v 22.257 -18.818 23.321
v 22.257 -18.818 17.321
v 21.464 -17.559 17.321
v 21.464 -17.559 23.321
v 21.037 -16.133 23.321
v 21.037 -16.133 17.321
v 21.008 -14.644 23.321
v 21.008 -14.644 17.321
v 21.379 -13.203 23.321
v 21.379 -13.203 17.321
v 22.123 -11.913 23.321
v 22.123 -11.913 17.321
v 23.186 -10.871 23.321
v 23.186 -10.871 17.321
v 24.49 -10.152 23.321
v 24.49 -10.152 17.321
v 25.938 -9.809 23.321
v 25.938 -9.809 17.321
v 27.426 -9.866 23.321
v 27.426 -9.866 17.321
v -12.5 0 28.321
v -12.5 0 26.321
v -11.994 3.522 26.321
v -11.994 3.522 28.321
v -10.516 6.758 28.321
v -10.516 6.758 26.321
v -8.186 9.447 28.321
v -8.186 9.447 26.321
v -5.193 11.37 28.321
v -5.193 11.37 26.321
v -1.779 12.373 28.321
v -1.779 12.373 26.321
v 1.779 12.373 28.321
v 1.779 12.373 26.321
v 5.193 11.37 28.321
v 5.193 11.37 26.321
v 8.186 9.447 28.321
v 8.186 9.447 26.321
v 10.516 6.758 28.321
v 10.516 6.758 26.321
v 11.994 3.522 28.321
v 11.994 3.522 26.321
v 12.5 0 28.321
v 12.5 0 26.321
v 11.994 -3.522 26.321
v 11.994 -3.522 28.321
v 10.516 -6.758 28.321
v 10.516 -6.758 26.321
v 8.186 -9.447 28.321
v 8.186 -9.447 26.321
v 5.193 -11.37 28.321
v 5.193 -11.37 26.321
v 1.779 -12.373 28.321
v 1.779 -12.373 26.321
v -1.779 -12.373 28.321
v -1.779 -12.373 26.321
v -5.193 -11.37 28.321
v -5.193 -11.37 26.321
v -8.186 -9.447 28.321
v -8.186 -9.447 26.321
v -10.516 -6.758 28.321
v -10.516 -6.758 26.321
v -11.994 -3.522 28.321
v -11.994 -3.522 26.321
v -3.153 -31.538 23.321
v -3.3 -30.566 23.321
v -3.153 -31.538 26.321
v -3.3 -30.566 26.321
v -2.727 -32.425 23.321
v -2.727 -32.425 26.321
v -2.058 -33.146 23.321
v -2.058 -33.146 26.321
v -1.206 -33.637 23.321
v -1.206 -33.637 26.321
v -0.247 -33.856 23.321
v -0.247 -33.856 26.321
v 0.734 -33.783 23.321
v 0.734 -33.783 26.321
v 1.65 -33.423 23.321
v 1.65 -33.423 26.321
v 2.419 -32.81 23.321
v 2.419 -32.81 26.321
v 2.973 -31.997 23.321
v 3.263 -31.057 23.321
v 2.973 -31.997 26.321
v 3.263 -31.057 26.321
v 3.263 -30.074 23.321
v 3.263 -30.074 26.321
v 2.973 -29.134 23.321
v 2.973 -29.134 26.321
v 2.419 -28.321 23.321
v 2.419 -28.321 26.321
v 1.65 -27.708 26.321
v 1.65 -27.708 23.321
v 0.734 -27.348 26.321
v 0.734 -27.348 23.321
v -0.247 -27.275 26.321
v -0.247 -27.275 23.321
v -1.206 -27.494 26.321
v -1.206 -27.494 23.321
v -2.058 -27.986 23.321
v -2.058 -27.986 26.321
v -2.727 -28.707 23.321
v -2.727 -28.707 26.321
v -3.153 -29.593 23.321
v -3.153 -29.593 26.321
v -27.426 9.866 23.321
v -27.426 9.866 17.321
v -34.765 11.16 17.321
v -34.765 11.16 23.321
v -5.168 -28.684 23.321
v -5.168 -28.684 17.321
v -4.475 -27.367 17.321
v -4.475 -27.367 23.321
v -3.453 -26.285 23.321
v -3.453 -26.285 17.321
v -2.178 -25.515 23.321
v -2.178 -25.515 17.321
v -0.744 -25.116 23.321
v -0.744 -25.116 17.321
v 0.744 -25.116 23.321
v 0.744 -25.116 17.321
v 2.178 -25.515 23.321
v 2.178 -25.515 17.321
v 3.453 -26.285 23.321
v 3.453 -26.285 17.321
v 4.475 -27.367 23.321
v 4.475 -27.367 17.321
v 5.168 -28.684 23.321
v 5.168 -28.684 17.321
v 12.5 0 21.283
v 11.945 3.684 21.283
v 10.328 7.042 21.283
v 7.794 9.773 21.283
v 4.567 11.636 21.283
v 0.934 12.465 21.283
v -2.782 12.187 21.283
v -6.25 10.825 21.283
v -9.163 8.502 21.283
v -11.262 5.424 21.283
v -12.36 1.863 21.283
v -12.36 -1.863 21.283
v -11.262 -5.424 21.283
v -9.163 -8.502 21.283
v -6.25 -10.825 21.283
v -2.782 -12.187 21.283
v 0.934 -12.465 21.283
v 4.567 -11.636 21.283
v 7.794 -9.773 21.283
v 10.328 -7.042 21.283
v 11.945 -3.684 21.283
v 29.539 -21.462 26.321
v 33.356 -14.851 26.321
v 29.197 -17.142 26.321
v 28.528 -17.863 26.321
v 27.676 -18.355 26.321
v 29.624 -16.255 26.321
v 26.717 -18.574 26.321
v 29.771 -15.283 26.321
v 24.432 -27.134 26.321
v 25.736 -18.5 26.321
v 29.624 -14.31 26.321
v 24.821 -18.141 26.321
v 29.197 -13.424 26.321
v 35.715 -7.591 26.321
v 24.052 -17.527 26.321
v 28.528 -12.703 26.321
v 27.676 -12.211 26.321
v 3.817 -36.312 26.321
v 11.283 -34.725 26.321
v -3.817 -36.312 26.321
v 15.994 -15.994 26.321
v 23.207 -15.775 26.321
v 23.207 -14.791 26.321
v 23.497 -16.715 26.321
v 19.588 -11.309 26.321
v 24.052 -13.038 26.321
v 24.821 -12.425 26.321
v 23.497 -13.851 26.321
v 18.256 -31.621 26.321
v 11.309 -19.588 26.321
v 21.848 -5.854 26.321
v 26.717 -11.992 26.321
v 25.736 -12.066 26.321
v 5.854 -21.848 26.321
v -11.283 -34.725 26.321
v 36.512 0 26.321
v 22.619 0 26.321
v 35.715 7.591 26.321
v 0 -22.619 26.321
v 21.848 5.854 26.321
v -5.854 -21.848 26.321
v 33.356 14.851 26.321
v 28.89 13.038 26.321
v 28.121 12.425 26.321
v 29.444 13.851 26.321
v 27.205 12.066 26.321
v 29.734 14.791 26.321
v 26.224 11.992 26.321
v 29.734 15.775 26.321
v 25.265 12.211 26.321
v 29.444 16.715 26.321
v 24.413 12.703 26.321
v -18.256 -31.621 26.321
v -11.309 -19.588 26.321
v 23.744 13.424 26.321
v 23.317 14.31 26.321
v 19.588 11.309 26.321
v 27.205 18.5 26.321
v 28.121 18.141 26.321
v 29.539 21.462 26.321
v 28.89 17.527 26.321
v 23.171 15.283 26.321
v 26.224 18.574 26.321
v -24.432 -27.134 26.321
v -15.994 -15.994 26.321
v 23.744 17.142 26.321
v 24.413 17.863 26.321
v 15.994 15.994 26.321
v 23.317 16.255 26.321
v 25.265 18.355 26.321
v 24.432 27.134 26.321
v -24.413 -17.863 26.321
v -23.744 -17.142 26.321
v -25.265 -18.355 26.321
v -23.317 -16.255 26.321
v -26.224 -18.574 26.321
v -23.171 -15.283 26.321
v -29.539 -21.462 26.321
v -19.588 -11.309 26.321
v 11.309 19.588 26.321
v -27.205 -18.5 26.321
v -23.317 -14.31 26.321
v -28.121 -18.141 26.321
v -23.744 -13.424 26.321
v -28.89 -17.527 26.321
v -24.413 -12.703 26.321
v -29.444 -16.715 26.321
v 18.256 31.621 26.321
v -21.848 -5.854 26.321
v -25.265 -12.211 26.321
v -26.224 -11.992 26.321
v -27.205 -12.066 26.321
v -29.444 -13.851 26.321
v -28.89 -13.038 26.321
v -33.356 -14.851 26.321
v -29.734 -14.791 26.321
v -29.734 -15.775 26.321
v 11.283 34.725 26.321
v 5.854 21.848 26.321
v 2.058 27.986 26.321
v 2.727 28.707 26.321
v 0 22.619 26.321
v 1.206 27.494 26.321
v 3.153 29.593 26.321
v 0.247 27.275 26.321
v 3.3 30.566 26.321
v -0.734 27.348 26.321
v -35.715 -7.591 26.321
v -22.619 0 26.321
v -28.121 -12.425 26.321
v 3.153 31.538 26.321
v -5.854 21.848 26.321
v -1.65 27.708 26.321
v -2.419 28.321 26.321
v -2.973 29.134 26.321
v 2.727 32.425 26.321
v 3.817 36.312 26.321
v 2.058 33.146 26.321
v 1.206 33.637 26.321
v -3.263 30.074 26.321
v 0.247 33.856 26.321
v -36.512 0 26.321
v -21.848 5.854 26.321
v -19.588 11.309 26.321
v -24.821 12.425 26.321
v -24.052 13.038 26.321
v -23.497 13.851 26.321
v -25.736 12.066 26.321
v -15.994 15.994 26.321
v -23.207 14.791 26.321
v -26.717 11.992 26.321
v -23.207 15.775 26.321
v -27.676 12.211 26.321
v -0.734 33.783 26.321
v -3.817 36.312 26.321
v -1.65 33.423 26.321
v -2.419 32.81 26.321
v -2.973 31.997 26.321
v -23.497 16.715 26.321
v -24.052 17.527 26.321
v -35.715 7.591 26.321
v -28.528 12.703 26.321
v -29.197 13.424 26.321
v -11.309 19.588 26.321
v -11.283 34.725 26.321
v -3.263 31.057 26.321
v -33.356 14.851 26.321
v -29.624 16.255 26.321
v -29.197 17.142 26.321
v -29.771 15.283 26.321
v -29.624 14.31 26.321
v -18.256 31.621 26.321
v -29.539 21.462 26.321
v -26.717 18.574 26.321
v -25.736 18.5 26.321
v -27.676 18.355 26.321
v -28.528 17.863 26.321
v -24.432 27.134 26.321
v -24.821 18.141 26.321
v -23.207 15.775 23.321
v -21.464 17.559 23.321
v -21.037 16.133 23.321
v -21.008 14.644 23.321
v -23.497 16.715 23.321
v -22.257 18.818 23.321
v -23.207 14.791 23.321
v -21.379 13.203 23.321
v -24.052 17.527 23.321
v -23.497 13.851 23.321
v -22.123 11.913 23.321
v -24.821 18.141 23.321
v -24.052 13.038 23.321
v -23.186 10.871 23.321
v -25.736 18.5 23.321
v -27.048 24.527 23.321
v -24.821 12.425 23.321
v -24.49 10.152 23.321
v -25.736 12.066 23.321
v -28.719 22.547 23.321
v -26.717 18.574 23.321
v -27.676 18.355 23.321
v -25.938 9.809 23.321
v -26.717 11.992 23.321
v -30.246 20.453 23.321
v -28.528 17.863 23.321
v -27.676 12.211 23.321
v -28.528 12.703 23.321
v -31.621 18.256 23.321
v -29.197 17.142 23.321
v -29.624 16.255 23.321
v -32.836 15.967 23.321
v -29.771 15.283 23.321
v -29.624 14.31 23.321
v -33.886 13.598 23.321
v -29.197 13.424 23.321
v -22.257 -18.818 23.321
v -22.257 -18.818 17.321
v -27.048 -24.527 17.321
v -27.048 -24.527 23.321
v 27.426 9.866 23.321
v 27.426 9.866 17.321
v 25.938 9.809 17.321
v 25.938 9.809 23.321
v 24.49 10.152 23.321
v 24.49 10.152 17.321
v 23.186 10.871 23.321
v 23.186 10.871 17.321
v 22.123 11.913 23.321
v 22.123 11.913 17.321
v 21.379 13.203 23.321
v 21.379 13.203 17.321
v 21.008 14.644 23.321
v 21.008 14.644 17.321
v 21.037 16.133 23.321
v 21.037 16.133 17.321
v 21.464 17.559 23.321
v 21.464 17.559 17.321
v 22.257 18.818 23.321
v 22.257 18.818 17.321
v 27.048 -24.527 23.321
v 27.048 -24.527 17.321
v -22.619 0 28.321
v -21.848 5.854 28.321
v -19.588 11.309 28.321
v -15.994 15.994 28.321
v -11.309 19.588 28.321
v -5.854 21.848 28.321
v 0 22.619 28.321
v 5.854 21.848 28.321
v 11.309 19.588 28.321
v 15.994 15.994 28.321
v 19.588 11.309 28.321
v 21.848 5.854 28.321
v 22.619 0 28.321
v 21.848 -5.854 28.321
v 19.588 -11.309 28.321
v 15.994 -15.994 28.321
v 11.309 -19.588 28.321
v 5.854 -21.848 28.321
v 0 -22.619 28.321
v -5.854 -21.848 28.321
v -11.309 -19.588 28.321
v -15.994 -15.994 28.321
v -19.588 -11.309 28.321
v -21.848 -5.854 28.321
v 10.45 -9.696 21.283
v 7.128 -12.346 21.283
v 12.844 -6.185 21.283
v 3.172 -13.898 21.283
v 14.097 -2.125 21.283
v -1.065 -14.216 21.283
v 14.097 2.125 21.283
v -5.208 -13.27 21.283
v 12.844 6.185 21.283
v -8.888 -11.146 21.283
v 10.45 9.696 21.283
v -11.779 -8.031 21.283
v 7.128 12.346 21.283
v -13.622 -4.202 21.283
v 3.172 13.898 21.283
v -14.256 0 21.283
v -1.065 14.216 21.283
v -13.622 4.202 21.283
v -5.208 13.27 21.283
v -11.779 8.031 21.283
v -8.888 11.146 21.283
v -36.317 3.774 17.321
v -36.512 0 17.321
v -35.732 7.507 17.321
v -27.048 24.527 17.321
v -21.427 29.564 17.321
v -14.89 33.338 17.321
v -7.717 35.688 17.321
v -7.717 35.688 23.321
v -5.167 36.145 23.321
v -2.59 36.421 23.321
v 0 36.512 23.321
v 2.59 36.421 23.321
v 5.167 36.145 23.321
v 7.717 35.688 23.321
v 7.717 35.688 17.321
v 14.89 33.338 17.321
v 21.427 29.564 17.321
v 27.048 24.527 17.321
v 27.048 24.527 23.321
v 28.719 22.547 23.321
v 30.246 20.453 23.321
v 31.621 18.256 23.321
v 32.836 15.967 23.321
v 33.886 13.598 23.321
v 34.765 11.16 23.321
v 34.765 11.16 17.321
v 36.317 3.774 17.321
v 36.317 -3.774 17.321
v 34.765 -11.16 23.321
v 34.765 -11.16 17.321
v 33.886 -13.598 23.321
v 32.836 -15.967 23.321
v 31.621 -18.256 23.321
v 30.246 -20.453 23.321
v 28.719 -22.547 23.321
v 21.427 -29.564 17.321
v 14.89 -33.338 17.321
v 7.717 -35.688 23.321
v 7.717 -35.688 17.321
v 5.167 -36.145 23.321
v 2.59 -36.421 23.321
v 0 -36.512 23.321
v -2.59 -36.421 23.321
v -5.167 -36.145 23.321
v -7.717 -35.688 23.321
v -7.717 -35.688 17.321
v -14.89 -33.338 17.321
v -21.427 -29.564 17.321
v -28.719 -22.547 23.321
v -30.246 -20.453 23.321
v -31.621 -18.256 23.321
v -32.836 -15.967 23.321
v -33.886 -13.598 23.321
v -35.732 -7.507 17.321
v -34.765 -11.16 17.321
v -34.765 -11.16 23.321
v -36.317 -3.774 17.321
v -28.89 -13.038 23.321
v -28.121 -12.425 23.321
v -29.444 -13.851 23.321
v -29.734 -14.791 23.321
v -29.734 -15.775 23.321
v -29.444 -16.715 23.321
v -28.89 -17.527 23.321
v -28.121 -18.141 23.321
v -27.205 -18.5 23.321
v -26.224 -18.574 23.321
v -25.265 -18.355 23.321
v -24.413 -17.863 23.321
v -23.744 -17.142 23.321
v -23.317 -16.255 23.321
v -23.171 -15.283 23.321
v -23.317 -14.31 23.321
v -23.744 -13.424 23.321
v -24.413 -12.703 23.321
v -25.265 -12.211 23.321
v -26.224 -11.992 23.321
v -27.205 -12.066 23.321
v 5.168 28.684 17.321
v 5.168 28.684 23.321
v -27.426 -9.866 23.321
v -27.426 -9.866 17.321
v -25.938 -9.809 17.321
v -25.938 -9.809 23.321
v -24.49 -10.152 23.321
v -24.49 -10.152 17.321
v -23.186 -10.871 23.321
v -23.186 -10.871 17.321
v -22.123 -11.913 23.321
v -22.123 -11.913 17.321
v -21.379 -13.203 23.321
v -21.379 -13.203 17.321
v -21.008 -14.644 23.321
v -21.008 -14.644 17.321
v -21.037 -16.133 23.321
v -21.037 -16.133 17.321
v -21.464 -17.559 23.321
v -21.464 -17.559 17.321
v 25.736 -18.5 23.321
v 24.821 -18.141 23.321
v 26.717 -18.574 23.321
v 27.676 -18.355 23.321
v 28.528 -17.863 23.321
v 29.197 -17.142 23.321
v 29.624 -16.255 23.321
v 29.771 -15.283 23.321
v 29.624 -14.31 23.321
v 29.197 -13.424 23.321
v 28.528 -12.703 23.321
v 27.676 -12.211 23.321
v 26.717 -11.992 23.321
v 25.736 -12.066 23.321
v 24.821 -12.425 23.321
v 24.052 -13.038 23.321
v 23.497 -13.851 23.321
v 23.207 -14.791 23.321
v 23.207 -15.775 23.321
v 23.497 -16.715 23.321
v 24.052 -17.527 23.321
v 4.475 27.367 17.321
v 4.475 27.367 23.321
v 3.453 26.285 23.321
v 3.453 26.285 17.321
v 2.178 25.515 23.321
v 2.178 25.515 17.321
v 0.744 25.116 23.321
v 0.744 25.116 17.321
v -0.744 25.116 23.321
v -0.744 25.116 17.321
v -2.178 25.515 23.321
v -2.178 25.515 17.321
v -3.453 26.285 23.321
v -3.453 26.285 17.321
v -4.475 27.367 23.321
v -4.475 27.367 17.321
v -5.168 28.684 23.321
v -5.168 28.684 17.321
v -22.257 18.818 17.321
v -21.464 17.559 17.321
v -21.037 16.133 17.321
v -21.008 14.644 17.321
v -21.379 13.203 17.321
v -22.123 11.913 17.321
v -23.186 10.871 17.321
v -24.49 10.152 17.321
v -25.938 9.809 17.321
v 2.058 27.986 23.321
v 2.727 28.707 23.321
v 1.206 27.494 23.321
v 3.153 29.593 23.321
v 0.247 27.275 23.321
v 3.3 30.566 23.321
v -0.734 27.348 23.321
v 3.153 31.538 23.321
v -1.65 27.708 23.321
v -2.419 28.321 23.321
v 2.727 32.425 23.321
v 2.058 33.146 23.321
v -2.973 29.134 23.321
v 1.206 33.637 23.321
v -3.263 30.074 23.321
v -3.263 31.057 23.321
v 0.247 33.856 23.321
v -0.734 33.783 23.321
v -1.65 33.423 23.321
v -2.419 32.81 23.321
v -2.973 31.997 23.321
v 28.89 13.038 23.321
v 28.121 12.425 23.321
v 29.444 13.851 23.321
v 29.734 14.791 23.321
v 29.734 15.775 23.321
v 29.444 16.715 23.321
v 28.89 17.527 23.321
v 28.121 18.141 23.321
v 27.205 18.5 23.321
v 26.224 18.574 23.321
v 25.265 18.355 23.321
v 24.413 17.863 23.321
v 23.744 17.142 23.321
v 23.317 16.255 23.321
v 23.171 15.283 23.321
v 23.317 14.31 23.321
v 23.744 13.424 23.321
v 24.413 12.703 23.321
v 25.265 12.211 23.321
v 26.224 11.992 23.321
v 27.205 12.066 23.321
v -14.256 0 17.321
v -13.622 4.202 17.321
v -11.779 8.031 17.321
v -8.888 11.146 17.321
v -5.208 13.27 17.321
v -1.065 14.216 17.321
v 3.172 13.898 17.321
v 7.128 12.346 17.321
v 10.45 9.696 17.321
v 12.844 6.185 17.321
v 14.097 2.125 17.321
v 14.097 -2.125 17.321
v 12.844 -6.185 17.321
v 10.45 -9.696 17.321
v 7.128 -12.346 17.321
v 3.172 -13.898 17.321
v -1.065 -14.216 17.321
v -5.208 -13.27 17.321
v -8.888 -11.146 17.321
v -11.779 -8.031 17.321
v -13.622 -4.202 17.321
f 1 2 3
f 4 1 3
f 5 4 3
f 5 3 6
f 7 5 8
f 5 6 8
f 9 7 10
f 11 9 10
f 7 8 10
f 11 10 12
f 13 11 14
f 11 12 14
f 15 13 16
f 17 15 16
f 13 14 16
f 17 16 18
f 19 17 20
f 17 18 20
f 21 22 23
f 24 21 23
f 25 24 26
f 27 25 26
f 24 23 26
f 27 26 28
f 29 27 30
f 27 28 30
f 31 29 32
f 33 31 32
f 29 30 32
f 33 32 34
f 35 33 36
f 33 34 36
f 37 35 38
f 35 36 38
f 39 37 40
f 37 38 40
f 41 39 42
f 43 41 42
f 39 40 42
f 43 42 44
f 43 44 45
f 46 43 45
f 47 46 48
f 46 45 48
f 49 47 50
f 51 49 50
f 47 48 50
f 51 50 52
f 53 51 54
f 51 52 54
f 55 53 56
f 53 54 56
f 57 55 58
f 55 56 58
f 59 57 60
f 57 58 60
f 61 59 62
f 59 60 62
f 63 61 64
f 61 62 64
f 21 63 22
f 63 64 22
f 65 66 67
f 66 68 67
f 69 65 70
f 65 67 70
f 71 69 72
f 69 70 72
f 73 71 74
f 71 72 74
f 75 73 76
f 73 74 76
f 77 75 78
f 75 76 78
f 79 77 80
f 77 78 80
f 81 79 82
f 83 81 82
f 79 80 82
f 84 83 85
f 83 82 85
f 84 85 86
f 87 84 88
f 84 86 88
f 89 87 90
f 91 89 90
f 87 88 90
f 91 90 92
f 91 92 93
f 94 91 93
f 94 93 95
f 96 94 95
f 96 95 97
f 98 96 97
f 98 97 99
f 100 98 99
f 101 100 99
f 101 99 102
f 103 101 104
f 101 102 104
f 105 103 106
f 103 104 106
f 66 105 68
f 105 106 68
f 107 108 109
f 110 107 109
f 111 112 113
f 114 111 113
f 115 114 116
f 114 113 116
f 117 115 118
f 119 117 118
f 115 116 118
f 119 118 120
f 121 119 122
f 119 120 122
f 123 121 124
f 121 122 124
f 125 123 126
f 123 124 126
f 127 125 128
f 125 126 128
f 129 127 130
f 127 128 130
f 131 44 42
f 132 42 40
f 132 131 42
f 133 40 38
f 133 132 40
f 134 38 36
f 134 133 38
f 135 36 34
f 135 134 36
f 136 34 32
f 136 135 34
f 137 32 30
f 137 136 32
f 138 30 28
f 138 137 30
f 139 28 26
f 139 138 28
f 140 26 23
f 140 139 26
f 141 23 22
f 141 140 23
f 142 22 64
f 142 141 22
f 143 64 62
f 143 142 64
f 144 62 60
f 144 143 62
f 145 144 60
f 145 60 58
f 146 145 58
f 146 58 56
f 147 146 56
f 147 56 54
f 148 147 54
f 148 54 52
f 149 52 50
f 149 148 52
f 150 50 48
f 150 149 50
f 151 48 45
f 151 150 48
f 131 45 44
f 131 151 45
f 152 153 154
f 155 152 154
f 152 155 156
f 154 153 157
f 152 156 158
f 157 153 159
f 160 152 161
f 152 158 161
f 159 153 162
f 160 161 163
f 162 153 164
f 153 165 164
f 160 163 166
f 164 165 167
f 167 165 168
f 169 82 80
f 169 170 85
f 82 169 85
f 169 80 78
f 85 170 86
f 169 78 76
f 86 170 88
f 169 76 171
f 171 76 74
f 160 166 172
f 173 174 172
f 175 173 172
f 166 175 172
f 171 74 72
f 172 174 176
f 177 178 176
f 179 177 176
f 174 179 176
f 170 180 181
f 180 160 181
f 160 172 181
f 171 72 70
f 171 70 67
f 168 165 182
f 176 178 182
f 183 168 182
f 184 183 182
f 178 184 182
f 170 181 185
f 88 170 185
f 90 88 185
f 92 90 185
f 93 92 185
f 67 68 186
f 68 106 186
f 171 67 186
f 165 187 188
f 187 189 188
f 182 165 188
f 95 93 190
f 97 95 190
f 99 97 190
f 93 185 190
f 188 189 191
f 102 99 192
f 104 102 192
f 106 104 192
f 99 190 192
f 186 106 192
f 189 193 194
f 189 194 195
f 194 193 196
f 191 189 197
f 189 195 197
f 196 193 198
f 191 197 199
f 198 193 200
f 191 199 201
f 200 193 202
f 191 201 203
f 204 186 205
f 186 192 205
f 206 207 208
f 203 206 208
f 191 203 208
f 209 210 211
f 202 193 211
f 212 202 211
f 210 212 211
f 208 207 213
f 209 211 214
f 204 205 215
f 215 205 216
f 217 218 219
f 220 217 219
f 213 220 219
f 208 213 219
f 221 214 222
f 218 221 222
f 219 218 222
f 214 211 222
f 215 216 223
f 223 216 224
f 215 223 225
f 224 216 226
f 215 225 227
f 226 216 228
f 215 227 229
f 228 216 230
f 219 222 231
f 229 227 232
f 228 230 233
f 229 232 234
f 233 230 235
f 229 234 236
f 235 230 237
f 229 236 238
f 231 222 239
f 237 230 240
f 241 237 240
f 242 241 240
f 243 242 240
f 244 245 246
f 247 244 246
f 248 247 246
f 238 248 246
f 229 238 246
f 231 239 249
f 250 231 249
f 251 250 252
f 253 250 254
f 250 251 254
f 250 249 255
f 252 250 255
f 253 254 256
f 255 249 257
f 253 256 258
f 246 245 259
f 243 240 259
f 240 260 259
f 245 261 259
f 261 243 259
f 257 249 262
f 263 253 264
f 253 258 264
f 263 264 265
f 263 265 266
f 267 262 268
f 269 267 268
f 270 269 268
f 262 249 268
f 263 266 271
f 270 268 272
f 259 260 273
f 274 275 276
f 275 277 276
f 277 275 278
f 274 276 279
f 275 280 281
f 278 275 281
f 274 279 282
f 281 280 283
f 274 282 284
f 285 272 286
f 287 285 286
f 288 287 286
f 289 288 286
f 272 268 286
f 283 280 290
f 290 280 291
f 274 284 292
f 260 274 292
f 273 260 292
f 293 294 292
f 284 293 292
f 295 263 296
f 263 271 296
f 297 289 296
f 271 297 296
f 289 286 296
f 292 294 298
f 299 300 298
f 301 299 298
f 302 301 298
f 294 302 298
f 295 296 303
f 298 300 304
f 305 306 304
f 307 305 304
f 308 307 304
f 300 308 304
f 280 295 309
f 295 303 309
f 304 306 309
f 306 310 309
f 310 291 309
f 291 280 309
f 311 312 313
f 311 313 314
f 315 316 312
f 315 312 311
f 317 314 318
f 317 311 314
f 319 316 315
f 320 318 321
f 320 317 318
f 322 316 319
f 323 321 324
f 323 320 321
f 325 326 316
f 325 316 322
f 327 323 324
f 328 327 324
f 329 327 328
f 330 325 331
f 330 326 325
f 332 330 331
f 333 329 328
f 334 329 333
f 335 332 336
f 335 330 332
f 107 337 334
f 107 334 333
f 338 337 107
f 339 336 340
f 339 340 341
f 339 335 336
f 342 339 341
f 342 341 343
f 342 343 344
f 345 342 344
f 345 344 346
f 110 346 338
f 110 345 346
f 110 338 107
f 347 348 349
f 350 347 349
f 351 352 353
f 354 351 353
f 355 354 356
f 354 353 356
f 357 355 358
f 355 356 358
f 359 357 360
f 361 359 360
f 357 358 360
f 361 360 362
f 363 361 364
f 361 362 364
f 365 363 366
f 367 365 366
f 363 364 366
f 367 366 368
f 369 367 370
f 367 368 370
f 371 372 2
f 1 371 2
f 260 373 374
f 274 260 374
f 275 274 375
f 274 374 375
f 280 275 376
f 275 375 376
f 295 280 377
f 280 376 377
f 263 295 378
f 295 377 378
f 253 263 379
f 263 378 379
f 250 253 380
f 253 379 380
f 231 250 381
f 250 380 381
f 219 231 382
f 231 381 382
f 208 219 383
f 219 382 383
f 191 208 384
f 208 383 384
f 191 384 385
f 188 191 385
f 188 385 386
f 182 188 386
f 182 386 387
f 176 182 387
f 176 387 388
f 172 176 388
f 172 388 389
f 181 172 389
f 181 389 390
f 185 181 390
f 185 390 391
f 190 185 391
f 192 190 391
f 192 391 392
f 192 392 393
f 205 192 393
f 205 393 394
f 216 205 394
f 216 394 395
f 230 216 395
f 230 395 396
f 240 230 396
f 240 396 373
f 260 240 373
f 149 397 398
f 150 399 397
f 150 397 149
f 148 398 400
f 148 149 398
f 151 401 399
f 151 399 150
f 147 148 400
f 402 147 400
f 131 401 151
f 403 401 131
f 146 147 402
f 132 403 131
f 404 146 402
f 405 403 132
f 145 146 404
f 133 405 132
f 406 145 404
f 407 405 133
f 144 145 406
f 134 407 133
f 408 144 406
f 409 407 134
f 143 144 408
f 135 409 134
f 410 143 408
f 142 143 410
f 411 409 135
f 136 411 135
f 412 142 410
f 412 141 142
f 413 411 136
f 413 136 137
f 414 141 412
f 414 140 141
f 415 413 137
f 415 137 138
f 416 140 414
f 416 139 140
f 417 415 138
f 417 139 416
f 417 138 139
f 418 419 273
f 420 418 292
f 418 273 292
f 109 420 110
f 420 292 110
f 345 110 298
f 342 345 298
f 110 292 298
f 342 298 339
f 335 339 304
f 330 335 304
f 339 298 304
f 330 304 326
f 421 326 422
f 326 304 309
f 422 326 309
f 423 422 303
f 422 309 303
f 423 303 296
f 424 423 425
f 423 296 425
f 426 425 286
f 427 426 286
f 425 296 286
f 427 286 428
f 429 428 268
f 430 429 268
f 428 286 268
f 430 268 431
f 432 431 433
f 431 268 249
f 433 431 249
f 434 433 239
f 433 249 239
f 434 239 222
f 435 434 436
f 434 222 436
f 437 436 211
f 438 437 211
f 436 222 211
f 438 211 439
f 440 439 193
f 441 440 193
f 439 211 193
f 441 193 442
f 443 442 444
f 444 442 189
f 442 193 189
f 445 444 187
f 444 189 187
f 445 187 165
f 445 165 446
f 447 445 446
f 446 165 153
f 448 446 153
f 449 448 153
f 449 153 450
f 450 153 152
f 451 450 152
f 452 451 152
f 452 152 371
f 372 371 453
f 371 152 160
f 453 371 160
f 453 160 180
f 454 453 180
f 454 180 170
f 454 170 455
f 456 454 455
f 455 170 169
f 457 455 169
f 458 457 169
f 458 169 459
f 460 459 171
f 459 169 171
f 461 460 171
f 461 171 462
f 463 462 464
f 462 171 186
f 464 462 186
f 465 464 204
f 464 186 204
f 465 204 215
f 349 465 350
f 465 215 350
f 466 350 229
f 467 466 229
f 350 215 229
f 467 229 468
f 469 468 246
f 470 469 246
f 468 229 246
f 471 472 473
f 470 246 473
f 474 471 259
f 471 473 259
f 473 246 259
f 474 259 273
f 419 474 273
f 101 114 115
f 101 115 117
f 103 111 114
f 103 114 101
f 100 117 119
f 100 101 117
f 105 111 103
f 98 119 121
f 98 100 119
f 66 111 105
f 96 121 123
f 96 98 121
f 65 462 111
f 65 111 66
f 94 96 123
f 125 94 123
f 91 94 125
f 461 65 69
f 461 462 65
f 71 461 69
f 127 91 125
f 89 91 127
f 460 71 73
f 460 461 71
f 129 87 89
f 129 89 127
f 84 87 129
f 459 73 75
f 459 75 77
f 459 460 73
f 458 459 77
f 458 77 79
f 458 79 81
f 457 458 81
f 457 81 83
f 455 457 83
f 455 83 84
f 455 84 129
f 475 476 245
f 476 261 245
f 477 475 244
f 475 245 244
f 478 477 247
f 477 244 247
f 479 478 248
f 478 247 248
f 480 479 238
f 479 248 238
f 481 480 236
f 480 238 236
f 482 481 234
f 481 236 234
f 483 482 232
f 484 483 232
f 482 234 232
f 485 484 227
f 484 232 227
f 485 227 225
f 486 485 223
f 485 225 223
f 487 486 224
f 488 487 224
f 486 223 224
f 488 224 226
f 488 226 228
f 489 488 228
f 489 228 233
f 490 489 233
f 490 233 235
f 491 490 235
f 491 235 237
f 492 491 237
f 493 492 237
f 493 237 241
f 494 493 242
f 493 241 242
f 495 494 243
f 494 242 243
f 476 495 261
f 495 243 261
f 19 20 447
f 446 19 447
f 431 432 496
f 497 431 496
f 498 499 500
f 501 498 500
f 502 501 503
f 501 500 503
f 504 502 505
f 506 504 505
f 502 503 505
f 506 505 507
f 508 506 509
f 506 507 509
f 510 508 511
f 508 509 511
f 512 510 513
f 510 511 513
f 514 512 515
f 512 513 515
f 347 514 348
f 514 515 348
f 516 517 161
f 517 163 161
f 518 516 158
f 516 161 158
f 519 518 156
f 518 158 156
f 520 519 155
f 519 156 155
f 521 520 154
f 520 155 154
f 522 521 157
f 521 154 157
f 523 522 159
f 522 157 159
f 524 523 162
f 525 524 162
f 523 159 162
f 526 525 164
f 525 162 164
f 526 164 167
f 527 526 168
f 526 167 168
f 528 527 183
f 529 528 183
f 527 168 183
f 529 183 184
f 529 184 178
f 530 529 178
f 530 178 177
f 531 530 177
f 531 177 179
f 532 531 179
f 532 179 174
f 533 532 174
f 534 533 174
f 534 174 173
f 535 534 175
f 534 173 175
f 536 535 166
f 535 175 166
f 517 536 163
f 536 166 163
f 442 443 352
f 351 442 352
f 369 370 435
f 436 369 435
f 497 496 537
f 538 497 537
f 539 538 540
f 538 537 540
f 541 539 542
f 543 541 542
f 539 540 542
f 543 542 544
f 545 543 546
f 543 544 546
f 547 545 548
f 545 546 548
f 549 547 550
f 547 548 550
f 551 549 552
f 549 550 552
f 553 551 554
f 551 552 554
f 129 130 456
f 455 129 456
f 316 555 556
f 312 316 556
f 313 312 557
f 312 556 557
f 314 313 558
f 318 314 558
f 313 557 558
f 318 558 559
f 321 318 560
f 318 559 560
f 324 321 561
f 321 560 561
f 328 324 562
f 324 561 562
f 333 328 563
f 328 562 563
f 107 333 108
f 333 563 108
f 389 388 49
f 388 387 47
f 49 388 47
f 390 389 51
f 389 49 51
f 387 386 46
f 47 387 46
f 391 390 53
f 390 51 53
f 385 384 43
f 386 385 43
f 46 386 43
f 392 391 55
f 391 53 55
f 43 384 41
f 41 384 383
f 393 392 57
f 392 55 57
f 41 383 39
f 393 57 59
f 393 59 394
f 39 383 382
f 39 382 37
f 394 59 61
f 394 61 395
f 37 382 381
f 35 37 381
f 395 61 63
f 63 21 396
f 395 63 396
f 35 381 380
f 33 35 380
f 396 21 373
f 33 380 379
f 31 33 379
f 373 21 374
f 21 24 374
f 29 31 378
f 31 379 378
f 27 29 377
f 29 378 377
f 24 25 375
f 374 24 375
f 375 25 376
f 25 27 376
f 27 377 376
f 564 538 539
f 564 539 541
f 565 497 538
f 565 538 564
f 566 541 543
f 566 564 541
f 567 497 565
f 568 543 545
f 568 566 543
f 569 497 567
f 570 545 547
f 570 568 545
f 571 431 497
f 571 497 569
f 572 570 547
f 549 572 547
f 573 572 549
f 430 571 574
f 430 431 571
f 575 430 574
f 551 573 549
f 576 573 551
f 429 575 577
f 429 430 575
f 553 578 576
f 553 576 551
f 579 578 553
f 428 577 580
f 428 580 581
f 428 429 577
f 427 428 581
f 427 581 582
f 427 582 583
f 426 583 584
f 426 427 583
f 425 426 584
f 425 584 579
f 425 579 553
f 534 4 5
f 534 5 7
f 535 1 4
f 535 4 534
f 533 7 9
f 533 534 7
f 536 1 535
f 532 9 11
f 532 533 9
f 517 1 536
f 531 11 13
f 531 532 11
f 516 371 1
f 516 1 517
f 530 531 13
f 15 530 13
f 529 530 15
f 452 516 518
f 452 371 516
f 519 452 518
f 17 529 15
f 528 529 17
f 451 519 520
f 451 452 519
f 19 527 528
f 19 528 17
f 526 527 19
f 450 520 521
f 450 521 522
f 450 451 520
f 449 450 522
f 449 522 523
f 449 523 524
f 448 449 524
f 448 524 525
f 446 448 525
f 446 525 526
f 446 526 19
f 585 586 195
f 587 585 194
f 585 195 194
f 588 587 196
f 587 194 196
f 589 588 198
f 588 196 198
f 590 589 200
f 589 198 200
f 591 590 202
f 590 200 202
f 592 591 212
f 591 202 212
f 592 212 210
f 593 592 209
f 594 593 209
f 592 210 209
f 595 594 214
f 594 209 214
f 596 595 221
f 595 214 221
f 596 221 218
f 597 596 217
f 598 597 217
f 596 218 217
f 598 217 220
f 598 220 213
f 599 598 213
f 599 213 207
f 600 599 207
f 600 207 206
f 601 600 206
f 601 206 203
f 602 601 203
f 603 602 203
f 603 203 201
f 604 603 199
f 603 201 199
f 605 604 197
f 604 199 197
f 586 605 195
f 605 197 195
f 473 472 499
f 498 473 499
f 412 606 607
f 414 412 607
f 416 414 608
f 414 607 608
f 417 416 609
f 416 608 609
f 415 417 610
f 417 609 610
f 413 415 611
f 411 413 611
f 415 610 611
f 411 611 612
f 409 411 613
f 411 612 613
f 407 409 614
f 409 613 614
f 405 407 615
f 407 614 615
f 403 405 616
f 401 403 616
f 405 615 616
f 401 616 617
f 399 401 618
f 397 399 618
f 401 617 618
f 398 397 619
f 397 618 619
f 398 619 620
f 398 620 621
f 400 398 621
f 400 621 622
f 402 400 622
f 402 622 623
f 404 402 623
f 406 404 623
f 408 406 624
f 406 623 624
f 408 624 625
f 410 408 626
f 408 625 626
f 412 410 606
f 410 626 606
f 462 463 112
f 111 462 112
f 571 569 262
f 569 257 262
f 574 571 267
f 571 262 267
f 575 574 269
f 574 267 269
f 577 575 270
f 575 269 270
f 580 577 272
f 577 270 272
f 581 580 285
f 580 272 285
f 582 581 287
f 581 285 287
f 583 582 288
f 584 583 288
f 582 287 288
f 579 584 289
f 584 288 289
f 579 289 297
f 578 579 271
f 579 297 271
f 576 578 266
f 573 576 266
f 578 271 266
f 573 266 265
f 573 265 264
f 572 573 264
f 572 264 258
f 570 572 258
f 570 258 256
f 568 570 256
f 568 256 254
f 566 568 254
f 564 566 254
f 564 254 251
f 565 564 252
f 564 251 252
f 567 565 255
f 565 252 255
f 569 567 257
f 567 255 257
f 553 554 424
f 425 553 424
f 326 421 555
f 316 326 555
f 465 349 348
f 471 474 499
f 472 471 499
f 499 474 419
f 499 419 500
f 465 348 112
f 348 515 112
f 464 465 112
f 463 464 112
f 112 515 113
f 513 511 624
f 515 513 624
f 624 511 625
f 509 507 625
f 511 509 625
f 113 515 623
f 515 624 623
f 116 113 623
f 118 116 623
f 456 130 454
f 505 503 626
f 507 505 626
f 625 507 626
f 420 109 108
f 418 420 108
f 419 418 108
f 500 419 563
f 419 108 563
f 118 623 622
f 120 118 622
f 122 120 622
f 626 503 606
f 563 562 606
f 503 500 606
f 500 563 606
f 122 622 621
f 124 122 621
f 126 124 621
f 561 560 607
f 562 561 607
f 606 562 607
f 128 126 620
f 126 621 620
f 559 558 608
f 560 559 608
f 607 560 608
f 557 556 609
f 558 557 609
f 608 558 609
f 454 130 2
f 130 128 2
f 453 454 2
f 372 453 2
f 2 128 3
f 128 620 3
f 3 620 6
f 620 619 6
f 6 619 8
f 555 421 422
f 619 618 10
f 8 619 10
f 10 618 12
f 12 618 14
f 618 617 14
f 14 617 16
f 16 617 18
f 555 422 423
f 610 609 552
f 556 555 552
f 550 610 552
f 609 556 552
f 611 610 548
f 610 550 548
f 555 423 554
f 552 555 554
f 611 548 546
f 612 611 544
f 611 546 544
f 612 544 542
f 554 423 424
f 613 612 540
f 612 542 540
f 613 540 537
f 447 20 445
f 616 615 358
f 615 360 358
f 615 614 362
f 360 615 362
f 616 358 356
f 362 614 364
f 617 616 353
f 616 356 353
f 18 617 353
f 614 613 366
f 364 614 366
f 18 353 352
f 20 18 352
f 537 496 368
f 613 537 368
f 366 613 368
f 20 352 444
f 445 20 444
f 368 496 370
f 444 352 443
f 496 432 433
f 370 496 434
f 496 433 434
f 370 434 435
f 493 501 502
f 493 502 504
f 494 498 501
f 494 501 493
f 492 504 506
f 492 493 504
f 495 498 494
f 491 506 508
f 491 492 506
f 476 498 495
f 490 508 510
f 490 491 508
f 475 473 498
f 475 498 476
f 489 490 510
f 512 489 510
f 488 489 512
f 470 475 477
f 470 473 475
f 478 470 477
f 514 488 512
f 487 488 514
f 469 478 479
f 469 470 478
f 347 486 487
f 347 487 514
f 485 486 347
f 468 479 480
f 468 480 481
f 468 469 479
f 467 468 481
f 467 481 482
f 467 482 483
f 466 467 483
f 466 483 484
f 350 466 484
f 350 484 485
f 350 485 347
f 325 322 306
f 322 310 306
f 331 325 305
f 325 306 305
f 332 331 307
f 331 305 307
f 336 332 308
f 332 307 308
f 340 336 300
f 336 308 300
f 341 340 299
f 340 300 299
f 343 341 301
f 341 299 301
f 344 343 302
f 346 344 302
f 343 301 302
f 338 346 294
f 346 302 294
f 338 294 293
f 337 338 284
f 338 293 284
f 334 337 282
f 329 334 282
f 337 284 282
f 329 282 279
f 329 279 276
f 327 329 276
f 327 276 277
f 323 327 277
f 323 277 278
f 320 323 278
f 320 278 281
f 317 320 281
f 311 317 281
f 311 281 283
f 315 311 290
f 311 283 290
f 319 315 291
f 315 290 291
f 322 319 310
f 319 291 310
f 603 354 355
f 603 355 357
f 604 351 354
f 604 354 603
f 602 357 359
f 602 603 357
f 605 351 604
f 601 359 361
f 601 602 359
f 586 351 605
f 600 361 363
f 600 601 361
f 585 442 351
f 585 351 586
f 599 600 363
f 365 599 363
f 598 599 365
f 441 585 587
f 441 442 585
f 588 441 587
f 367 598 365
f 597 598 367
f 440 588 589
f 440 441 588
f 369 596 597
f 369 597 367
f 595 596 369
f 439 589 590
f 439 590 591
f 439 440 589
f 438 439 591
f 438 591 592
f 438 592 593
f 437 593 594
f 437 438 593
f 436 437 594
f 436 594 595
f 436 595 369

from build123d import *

# Parameters (mm, degrees)
CUT_CENTER_DEPTH               = 53.414934066
CUT_CENTER_DEPTH_BACK          = 53.414934066
SKETCH_CENTER_CUT_R            = 12.5
CBORE_FOR_M6_SHCS1_D           = 6.6
CBORE_FOR_M6_SHCS1_CBORE_D     = 11
CBORE_FOR_M6_SHCS1_CBORE_DEPTH = 6
CIRPATTERN1_COUNT              = 6
SKETCH1_R                      = 14.25575
CUT_EXTRUDE1_DEPTH             = 3.9624
CUT_EXTRUDE2_DEPTH             = 6
CIRPATTERN2_COUNT              = 6


with BuildPart() as part:
    # Sketch Spindle Skeleton → Main Revolve (revolve)
    with BuildSketch(Plane(origin=(0, 0, 0), x_dir=(0, 0, -1), z_dir=(1, 0, 0)), mode=Mode.PRIVATE) as main_revolve_sk:
        Polygon((-26.320999936, -22.6187), (-26.320999936, -36.5125), (-17.320999902, -36.5125), (-17.320999902, -9.525), (-26.320999936, -9.525), (-26.320999936, -12.5), (-28.321, -12.5), (-28.321, -22.6187), align=None)
        Polygon((-26.320999936, 36.5125), (-26.320999936, 22.6187), (-28.321, 22.6187), (-28.321, 12.5), (-26.320999936, 12.5), (-26.320999936, 9.525), (-17.320999902, 9.525), (-17.320999902, 36.5125), align=None)
    revolve(main_revolve_sk.sketch.rotate(Axis((0, 0, 1000), (0, 0, -1)), 270), axis=Axis((0, 0, 1000), (0, 0, -1)))

    # Sketch Center Cut → Cut Center (cut, two sides: drawn at the far end of the back side and taken through both)
    with BuildSketch(Plane.XY.offset(26.320999936).offset(-CUT_CENTER_DEPTH_BACK)):
        Circle(SKETCH_CENTER_CUT_R)
    extrude(amount=CUT_CENTER_DEPTH + CUT_CENTER_DEPTH_BACK, mode=Mode.SUBTRACT)

    # CBORE for M6 SHCS1 (through all)
    with Locations(Plane(origin=(0, 0, 17.320999902), x_dir=(-1, 0, 0), z_dir=(0, 0, -1))):
        with Locations((0, 30.565600032)):
            cbore_for_m6_shcs1 = CounterBoreHole(CBORE_FOR_M6_SHCS1_D / 2, CBORE_FOR_M6_SHCS1_CBORE_D / 2, CBORE_FOR_M6_SHCS1_CBORE_DEPTH)

    # CirPattern1: CBORE for M6 SHCS1 ×6 about axis
    cirpattern1_axis = Axis((0, 0, 0), (0, 0, 1))
    for i in range(1, CIRPATTERN1_COUNT):
        add(cbore_for_m6_shcs1.rotate(cirpattern1_axis, i * 360 / CIRPATTERN1_COUNT), mode=Mode.SUBTRACT)

    # Sketch1 → Cut-Extrude1 (cut)
    with BuildSketch(Plane(origin=(0, 0, 17.320999902), x_dir=(-1, 0, 0), z_dir=(0, 0, -1))):
        Circle(SKETCH1_R)
    extrude(amount=-CUT_EXTRUDE1_DEPTH, mode=Mode.SUBTRACT)

    # Sketch2 → Cut-Extrude2 (cut)
    with BuildSketch(Plane(origin=(0, 0, 17.320999902), x_dir=(-1, 0, 0), z_dir=(0, 0, -1))):
        with BuildLine():
            ThreePointArc((5.5, 30.565600032), (5.416442642, 29.610535055), (5.168309414, 28.684489244))
            Line((5.168309414, 28.684489244), (7.71724355, 35.687628224))
            ThreePointArc((7.71724355, 35.687628224), (3.88060116, 36.305696397), (0, 36.5125))
            Line((0, 36.5125), (0, 36.065600032))
            ThreePointArc((0, 36.065600032), (3.889087297, 34.454687329), (5.5, 30.565600032))
        make_face()
        with BuildLine():
            Line((-7.71724355, 35.687628224), (-5.168309414, 28.684489244))
            ThreePointArc((-5.168309414, 28.684489244), (-4.505336244, 33.720270432), (0, 36.065600032))
            Line((0, 36.065600032), (0, 36.5125))
            ThreePointArc((0, 36.5125), (-3.88060116, 36.305696397), (-7.71724355, 35.687628224))
        make_face()
    cut_extrude2 = extrude(amount=-CUT_EXTRUDE2_DEPTH, mode=Mode.SUBTRACT)

    # CirPattern2: Cut-Extrude2 ×6 about axis
    cirpattern2_axis = Axis((0, 0, 0), (0, 0, 1))
    for i in range(1, CIRPATTERN2_COUNT):
        add(cut_extrude2.rotate(cirpattern2_axis, i * 360 / CIRPATTERN2_COUNT), mode=Mode.SUBTRACT)


solid = part.part
